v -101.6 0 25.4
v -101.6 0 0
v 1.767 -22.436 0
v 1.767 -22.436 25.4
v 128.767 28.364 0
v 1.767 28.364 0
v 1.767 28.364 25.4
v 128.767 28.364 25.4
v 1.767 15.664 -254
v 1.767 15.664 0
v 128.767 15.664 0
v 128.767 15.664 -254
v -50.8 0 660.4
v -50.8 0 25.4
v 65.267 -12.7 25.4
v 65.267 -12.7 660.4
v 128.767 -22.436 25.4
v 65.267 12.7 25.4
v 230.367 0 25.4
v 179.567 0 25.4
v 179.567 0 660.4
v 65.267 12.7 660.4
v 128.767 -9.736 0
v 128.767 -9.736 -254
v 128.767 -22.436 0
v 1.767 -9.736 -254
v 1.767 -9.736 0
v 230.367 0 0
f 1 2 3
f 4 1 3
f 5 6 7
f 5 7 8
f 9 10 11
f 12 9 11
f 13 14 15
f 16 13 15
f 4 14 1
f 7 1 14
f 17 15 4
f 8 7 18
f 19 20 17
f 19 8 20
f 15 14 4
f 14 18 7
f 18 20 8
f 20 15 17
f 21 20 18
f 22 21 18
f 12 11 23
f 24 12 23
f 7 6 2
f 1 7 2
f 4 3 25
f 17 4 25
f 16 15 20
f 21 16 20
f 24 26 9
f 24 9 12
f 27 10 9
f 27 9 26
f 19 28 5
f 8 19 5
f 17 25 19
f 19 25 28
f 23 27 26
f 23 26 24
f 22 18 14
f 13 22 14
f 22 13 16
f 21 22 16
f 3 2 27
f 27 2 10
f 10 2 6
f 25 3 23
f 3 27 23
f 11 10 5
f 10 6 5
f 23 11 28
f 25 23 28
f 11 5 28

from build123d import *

# Parameters (mm, degrees)
F0_W     = 127
F0_H     = 50.8
F1_DEPTH = 25.4
F3_DEPTH = 635
F4_W     = 127
F4_H     = 25.4
F5_DEPTH = 254


with BuildPart() as f1:
    # F0 (on Top) → F1 (new body)
    with BuildSketch(Plane.XY):
        Polygon((1.767107, -22.436125), (1.767107, 28.363875), (-101.6, 0), align=None)
        Polygon((230.367107, 0), (128.767107, 28.363875), (128.767107, -22.436125), align=None)
        with Locations((65.267107, 2.963875)):
            Rectangle(F0_W, F0_H)
    extrude(amount=F1_DEPTH)

    # F2 (on face) → F3 (join)
    with BuildSketch(Plane.XY.offset(25.4)):
        Polygon((179.567107, 0), (-50.8, 0), (65.267107, -12.7), align=None)
        Polygon((65.267107, 12.7), (-50.8, 0), (179.567107, 0), align=None)
    extrude(amount=F3_DEPTH)

    # F4 (on face) → F5 (join)
    with BuildSketch(Plane(origin=(0, 0, 0), x_dir=(1, 0, 0), z_dir=(0, 0, -1))):
        with Locations((65.267107, -2.963875)):
            Rectangle(F4_W, F4_H)
    extrude(amount=F5_DEPTH)


solid = f1.part
